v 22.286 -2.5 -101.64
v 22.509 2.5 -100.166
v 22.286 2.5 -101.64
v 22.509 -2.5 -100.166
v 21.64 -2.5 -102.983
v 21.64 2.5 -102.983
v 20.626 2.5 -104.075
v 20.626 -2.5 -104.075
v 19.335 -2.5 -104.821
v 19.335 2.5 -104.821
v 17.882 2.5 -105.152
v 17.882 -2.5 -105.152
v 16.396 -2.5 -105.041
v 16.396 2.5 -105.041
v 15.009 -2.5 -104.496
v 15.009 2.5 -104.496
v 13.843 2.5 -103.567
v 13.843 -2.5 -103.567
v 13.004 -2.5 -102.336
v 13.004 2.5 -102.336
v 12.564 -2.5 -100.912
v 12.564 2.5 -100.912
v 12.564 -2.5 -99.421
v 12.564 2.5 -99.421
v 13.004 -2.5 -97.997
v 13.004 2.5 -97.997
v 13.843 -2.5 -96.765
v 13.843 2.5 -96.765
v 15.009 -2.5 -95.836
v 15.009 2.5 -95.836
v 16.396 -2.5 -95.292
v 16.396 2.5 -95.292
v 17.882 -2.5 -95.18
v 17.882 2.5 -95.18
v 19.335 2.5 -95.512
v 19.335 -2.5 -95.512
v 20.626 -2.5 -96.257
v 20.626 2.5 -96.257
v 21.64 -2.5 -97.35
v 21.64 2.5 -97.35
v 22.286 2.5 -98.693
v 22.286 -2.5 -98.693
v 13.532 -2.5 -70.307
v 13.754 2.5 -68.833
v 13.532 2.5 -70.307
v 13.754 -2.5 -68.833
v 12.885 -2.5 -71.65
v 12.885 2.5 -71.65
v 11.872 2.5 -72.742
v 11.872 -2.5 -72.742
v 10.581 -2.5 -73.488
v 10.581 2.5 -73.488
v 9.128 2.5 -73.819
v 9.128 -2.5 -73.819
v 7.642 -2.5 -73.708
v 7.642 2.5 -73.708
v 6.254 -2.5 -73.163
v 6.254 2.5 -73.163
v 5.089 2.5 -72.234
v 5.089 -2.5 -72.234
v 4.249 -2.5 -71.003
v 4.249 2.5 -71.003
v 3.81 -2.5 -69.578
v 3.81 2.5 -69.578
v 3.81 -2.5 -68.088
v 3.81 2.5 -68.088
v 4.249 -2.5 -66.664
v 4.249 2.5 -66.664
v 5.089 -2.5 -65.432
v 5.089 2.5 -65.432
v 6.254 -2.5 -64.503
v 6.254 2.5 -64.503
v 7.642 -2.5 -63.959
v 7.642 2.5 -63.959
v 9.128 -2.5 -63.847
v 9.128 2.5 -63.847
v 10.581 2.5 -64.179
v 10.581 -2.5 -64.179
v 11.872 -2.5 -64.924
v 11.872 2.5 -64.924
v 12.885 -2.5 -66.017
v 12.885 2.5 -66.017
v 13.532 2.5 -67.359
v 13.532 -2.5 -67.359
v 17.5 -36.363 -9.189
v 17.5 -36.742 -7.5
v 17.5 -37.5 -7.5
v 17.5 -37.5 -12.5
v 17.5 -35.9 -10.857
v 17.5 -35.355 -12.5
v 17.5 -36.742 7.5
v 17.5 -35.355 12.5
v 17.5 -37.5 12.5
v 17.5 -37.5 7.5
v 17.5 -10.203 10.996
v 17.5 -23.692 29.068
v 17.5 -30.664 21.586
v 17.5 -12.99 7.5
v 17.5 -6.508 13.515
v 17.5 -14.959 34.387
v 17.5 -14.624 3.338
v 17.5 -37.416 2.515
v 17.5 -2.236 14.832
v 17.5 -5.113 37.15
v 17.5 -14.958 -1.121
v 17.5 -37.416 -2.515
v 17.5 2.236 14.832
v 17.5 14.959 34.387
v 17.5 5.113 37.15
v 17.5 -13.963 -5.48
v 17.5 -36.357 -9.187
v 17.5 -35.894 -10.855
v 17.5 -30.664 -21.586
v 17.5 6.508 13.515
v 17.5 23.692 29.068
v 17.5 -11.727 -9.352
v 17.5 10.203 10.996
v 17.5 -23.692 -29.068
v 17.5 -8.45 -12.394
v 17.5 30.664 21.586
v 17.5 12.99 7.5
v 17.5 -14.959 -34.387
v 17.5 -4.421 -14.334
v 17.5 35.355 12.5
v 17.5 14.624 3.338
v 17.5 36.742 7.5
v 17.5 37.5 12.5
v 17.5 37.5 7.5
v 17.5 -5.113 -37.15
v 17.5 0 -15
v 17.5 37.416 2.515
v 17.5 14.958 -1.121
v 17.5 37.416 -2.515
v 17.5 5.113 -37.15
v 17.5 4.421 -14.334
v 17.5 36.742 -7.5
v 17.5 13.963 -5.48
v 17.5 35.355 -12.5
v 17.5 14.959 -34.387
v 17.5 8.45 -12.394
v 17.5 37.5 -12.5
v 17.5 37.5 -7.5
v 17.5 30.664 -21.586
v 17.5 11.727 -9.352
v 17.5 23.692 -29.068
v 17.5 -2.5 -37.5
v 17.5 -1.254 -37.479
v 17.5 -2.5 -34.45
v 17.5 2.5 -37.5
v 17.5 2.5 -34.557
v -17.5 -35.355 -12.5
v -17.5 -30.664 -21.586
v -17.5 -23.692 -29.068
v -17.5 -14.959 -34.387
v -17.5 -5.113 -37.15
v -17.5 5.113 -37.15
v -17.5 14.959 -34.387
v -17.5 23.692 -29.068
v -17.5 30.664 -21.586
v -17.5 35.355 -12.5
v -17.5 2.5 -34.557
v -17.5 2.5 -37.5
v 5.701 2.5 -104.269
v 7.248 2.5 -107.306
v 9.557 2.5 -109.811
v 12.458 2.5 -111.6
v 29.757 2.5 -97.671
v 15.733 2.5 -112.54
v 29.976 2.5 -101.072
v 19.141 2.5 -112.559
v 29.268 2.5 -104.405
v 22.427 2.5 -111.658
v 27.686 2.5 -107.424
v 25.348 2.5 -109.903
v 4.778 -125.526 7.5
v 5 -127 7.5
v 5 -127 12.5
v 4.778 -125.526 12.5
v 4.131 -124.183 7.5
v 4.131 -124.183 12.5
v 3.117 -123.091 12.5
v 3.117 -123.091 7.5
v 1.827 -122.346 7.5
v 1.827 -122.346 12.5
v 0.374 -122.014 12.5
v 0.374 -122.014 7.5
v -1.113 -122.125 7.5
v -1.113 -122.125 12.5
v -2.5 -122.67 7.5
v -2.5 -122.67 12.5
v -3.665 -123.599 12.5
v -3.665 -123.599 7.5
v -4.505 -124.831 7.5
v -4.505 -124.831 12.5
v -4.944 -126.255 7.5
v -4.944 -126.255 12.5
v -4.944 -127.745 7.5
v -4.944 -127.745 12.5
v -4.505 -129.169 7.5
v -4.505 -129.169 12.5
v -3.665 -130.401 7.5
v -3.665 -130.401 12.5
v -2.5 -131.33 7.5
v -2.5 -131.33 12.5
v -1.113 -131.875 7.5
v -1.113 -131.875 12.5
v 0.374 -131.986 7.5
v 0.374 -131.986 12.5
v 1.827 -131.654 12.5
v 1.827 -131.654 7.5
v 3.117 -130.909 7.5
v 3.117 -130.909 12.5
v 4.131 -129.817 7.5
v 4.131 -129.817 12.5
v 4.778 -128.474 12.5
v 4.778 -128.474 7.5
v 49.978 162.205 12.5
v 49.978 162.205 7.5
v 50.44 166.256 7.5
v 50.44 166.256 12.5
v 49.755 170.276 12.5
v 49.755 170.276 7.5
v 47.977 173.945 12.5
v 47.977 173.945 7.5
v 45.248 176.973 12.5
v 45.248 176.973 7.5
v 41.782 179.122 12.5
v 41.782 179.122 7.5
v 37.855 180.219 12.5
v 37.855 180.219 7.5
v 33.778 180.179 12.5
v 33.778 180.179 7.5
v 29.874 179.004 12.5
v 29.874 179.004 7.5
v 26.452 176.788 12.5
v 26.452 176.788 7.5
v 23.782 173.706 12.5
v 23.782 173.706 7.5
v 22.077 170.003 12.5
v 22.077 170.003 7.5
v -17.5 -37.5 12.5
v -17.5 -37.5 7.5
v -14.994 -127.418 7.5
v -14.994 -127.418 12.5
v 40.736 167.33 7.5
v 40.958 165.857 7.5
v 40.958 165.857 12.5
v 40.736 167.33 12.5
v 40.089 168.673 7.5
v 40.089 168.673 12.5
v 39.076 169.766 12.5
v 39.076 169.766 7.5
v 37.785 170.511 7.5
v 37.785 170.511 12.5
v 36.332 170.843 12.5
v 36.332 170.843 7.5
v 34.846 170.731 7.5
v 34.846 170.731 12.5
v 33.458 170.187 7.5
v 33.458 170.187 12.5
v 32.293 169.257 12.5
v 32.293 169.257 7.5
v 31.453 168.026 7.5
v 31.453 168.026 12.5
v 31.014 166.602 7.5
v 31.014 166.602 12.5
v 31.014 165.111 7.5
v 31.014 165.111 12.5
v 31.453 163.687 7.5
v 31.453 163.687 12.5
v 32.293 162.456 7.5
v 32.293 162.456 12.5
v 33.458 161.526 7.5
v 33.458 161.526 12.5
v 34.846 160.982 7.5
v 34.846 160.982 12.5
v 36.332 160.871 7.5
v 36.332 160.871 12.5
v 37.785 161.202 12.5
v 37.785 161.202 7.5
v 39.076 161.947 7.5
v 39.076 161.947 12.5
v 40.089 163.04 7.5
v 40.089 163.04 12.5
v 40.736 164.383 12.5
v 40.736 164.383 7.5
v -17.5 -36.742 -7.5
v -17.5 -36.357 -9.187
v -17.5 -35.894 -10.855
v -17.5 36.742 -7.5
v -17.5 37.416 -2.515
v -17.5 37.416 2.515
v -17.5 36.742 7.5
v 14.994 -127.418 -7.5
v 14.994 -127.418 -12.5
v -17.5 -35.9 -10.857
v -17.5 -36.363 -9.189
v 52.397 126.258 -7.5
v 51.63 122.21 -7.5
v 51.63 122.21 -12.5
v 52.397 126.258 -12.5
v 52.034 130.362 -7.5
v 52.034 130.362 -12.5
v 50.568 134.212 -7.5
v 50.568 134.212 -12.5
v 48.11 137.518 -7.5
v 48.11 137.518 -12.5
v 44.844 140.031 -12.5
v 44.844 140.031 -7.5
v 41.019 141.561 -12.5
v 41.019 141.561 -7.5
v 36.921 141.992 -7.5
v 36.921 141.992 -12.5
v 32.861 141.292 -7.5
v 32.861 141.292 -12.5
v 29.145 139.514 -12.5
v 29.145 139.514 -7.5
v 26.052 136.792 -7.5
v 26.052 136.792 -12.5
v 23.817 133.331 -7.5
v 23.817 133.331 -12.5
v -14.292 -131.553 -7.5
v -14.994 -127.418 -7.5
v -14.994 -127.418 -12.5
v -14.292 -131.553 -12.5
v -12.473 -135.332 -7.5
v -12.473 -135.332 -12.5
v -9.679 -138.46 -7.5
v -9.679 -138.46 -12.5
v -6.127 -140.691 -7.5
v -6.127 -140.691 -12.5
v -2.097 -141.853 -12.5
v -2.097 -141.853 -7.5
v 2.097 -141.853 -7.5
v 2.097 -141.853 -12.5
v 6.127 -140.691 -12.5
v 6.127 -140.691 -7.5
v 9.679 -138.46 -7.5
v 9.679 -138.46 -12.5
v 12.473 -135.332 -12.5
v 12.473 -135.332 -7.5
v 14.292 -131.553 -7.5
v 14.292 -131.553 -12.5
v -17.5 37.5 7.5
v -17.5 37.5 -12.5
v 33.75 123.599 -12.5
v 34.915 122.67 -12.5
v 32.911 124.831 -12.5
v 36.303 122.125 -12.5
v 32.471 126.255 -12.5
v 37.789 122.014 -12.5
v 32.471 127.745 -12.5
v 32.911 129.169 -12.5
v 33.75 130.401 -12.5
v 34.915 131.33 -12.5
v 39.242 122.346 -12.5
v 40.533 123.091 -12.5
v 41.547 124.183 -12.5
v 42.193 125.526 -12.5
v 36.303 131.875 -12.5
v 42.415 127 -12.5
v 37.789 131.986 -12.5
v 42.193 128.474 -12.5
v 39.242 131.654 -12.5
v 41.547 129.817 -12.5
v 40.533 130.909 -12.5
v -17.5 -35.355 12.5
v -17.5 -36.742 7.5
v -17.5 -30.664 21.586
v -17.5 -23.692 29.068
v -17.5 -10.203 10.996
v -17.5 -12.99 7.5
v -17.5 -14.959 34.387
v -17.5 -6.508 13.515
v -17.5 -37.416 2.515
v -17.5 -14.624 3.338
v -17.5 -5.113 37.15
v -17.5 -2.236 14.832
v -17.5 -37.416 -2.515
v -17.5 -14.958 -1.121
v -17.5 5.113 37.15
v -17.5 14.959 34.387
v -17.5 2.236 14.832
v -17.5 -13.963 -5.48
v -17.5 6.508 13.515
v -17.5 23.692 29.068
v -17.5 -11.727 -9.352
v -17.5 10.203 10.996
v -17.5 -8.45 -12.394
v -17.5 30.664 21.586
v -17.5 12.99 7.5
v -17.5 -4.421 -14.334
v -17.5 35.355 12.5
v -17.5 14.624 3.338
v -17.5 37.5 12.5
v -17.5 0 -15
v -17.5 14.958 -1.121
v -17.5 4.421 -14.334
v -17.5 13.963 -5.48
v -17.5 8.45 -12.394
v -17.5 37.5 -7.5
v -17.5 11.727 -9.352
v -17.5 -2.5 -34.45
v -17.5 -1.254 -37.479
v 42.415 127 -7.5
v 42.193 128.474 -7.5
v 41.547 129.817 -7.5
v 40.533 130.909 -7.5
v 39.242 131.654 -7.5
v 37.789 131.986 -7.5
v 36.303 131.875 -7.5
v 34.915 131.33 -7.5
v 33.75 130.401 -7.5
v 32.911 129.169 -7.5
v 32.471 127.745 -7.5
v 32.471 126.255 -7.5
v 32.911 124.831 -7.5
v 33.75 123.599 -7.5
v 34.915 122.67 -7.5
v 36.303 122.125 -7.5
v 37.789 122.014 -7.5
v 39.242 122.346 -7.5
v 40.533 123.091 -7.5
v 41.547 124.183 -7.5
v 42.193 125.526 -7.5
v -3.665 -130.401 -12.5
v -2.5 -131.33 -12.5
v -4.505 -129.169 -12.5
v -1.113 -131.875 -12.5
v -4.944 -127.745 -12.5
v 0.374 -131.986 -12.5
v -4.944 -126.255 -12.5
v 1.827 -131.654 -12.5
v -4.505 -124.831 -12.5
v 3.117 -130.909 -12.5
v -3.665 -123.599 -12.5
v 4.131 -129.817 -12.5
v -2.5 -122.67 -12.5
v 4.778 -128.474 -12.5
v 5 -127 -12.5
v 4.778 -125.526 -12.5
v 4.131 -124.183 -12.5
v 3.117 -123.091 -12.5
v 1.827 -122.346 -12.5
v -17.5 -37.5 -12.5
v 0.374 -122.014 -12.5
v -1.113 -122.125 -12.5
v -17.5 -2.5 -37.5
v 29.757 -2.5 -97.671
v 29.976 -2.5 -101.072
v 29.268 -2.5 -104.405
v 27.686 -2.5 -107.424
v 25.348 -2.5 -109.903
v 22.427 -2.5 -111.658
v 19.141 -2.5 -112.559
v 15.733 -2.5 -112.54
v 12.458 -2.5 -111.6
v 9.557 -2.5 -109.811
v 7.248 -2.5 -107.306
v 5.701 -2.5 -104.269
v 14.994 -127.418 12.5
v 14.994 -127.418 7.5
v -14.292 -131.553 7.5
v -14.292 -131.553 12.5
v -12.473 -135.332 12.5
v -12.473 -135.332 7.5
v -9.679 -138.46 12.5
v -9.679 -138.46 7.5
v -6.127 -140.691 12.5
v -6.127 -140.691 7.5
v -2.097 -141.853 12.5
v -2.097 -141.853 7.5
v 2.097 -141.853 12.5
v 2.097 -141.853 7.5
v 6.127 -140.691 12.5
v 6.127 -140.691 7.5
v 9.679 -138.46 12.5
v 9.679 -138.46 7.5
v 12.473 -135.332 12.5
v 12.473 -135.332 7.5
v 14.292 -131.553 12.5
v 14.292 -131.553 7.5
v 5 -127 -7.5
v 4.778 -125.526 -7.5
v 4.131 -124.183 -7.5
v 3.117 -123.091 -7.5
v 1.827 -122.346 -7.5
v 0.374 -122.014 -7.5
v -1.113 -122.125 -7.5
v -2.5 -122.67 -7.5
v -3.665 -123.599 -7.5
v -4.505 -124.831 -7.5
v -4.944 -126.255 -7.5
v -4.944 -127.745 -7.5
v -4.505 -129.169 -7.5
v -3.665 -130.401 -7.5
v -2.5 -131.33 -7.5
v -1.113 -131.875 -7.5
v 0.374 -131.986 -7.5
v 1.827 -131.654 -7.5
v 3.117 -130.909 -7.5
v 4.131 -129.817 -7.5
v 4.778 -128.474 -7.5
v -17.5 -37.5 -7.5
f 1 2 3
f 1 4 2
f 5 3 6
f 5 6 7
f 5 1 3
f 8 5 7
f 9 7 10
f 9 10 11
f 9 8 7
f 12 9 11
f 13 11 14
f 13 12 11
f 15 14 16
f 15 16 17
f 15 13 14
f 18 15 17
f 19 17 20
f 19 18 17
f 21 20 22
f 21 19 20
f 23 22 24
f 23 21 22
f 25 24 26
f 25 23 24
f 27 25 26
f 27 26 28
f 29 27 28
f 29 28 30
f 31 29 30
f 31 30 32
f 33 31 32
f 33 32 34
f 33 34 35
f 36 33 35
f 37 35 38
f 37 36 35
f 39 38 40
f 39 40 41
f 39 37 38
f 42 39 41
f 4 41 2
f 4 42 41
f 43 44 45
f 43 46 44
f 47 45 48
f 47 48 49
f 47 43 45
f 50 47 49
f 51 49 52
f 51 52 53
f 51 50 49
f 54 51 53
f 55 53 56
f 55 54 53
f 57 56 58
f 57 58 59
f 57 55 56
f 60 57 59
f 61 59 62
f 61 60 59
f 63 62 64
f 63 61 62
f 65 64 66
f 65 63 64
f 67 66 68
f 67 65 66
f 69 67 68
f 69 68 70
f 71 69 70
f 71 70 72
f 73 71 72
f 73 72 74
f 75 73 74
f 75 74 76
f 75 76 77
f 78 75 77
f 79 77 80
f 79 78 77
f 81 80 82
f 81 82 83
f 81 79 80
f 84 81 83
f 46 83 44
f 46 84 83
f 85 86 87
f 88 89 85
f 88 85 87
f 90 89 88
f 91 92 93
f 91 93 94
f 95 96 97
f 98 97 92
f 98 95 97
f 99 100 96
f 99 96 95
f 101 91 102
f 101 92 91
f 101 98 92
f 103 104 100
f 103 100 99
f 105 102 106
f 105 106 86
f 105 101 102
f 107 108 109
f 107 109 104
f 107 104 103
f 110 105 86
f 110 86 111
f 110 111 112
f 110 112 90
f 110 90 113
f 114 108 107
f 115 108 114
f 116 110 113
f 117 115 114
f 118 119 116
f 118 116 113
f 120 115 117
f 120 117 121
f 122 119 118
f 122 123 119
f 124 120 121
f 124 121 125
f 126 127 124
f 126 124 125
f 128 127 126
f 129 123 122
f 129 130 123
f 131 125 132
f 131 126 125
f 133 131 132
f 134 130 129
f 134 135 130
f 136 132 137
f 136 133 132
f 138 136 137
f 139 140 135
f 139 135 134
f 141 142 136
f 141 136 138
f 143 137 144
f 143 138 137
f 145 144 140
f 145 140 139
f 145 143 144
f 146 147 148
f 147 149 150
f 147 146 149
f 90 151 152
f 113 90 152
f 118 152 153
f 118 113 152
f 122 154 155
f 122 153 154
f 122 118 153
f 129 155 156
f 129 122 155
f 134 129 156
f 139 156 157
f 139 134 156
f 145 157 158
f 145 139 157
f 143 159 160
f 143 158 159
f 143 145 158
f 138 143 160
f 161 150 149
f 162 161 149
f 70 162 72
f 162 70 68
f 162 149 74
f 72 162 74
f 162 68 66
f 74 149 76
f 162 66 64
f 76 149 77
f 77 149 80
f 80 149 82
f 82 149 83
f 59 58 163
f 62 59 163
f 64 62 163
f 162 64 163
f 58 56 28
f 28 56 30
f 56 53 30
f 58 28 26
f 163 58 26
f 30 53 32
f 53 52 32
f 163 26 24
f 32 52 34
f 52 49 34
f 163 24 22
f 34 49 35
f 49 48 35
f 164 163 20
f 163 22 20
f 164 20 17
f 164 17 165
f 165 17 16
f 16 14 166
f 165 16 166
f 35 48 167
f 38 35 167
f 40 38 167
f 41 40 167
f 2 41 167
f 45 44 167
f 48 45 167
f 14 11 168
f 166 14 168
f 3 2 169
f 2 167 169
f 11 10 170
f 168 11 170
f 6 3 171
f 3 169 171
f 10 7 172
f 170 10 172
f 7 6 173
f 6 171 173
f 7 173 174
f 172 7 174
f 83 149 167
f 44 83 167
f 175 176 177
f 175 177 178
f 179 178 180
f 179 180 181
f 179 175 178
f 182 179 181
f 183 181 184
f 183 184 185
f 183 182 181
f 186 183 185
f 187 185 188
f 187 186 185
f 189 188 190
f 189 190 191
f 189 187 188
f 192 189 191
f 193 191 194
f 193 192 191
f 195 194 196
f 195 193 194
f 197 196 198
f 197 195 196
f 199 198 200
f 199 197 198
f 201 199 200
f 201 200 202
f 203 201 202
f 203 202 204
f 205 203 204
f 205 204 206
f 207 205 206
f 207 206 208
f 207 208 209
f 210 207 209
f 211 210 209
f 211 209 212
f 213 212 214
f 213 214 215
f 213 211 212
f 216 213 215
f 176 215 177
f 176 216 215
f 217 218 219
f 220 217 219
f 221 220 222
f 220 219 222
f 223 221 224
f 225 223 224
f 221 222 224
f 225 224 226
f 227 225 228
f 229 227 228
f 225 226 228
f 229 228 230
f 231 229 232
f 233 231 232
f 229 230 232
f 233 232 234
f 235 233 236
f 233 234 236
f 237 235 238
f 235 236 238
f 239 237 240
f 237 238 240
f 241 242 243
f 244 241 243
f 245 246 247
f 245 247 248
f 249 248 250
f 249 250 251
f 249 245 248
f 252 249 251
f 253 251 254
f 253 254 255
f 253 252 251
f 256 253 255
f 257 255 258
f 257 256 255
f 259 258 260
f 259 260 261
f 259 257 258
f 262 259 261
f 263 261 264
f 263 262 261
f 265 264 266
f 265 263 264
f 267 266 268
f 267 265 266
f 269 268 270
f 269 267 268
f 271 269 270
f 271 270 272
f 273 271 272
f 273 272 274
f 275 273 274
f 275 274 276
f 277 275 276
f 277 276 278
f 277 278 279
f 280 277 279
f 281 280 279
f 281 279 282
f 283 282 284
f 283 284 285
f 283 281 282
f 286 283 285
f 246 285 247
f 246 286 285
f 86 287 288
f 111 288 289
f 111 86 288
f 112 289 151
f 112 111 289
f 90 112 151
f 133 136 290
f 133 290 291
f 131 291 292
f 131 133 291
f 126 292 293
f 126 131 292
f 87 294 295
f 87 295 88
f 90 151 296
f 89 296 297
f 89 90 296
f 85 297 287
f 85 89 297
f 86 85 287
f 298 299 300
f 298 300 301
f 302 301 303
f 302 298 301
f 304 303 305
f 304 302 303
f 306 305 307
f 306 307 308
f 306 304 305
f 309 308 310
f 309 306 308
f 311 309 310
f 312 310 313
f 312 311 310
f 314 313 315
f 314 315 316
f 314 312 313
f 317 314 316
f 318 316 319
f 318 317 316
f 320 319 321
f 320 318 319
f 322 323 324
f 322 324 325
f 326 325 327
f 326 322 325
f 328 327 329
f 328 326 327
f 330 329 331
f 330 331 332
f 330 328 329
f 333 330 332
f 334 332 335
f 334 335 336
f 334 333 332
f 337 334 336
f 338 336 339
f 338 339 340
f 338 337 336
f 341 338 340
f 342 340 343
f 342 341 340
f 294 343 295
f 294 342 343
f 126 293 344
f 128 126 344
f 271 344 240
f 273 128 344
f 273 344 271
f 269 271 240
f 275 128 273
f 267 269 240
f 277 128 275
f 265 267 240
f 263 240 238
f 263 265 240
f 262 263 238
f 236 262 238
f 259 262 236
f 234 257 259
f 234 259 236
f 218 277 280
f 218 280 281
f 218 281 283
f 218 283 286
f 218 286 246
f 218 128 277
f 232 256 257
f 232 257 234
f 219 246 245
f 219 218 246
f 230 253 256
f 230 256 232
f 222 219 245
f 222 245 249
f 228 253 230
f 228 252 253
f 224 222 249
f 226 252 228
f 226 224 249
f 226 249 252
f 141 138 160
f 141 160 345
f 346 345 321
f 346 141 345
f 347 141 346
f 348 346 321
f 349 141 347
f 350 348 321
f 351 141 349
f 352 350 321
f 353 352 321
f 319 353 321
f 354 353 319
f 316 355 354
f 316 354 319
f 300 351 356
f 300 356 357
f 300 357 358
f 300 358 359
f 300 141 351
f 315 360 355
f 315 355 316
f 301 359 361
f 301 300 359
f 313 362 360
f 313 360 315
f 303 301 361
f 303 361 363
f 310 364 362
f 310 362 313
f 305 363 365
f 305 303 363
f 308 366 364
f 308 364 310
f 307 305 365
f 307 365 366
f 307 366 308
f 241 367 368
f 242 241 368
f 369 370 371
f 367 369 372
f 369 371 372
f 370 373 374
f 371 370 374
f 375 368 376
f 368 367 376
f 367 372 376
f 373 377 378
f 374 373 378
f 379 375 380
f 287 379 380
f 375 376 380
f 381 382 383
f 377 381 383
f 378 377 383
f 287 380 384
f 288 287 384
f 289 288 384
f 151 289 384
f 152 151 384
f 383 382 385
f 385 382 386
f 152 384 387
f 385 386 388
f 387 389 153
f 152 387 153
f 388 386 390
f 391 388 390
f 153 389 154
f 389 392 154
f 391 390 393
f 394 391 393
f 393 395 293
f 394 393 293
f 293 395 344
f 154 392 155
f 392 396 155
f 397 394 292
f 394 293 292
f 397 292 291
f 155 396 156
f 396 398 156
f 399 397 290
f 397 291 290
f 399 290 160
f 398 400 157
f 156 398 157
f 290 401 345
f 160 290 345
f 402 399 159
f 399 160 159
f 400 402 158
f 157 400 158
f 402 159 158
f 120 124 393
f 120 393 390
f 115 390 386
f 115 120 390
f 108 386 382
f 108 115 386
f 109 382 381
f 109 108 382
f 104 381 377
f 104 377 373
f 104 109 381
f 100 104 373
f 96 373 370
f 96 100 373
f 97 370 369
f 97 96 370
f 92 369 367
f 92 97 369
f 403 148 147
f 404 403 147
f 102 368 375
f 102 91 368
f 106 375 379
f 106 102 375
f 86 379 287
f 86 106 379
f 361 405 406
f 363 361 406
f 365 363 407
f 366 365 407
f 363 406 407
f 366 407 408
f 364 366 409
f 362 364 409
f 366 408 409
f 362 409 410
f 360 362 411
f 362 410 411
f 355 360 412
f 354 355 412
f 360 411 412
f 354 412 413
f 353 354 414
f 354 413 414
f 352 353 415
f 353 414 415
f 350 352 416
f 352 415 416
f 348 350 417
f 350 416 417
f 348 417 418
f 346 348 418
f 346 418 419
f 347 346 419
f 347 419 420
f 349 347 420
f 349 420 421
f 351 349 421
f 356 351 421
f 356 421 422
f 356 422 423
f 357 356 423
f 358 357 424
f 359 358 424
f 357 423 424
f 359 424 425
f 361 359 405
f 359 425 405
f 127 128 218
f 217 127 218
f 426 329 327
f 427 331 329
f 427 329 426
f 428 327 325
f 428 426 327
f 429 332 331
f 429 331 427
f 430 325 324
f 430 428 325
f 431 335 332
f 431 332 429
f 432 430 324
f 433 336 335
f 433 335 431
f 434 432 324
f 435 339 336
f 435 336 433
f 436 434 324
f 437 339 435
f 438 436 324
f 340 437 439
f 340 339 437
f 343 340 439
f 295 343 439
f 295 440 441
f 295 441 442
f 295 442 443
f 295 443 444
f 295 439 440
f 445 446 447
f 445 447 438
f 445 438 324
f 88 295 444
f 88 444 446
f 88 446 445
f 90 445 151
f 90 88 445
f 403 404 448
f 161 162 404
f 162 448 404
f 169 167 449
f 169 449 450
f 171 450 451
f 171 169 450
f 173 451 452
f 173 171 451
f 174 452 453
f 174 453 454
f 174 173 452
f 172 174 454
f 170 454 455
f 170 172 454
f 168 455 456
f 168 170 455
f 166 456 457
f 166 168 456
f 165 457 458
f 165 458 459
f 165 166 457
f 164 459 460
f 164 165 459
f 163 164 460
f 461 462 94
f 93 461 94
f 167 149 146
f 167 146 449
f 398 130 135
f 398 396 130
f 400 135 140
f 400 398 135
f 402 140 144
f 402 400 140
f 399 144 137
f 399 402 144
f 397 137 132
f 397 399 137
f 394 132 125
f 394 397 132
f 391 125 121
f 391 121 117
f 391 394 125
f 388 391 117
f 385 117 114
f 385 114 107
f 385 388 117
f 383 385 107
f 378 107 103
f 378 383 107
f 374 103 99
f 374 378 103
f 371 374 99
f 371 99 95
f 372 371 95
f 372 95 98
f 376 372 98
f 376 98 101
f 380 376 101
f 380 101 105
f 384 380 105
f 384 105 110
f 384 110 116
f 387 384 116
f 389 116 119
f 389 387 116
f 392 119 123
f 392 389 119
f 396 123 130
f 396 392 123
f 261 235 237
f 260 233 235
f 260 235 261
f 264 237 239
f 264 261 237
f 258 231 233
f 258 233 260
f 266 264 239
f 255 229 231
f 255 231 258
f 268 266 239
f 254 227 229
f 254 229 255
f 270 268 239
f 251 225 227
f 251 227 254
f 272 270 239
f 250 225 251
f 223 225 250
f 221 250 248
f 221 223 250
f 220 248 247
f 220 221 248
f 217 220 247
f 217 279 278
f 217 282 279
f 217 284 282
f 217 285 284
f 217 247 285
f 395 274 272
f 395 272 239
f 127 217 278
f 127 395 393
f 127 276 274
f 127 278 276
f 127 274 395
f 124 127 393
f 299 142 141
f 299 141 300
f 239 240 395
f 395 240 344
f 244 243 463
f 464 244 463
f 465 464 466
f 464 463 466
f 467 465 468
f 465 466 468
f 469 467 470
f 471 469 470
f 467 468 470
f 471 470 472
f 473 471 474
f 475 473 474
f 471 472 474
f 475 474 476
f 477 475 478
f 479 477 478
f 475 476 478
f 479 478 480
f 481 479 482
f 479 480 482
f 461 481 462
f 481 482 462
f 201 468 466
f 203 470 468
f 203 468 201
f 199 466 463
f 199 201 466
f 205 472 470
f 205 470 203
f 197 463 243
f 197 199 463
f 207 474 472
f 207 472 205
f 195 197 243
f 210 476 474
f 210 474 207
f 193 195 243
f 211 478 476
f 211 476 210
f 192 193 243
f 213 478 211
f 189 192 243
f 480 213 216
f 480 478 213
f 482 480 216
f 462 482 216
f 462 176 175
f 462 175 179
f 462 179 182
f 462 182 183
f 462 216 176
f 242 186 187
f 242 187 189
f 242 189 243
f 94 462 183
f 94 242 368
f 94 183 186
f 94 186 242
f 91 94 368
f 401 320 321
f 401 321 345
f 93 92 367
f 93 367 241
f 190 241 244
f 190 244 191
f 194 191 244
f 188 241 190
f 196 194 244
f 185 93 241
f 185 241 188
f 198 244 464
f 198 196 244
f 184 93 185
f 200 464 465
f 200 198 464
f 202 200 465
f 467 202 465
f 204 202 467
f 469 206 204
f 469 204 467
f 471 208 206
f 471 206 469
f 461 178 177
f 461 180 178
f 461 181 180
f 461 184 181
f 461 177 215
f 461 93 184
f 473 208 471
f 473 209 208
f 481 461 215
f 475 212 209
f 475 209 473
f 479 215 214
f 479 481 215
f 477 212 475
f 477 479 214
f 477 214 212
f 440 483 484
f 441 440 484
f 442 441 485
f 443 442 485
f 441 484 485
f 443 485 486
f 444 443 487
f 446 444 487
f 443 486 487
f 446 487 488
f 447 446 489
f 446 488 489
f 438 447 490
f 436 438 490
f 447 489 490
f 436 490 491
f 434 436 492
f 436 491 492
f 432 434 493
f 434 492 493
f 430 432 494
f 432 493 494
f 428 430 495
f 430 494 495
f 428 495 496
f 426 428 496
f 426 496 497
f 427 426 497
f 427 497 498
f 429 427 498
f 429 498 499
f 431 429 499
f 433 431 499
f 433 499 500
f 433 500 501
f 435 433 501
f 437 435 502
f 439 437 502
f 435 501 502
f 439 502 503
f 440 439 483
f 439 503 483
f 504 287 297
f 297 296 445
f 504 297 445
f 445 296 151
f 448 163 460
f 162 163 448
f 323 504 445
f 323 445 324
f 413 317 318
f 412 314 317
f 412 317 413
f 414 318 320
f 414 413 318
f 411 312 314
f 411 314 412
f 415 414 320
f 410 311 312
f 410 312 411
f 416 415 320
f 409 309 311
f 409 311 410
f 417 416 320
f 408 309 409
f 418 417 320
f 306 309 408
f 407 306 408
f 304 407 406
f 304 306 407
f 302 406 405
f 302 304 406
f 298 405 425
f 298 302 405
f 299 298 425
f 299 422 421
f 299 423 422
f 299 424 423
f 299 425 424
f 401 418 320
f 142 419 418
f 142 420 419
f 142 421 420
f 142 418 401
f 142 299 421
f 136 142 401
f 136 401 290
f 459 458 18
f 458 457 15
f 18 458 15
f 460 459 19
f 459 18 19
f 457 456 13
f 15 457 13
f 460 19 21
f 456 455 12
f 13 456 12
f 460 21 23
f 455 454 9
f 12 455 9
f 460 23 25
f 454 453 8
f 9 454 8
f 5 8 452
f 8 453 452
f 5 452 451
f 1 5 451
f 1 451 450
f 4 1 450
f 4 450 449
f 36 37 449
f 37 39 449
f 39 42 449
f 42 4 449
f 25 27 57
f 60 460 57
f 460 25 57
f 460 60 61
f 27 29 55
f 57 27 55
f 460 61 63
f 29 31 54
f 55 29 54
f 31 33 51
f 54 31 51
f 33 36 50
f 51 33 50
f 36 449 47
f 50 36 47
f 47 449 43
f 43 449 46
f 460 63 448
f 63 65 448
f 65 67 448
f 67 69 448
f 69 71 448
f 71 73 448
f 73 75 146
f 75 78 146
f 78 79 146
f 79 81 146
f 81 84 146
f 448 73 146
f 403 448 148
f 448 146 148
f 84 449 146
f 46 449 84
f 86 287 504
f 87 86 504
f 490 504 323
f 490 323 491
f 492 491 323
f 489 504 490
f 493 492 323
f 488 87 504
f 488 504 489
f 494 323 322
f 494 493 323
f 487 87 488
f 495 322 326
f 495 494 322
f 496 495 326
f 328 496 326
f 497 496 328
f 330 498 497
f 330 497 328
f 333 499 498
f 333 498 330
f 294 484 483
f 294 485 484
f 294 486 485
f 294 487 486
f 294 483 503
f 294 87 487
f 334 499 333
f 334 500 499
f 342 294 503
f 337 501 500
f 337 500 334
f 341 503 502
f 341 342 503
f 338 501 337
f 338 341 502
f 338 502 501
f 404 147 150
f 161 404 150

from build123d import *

# Parameters (mm, degrees)
SKETCH1_R             = 37.5
SKETCH1_R_2           = 15
BOSS_EXTRUDE1_DEPTH   = 17.5
SKETCH5_R             = 5
BOSS_EXTRUDE3_DEPTH   = 5
BOSS_EXTRUDE3_2_DEPTH = 5
SKETCH4_R             = 5
BOSS_EXTRUDE5_DEPTH   = 5
BOSS_EXTRUDE5_2_DEPTH = 5
SKETCH10_R            = 5
BOSS_EXTRUDE8_DEPTH   = 2.5
BOSS_EXTRUDE9_DEPTH   = 35
BOSS_EXTRUDE10_DEPTH  = 35


with BuildPart() as part:
    # Sketch1 → Boss-Extrude1 (new body, symmetric)
    with BuildSketch(Plane(origin=(0, 0, 0), x_dir=(0, 0, -1), z_dir=(1, 0, 0))):
        Circle(SKETCH1_R)
        Circle(SKETCH1_R_2, mode=Mode.SUBTRACT)
    extrude(amount=BOSS_EXTRUDE1_DEPTH, both=True)



with BuildPart() as body_2:
    # Sketch5 → Boss-Extrude3 (new body)
    with BuildSketch(Plane.XY.offset(-7.5)):
        with BuildLine():
            Line((-17.5, -37.5), (-14.994178744, -127.417856179))
            ThreePointArc((-14.994178744, -127.417856179), (0, -142), (14.994178744, -127.417856179))
            Line((14.994178744, -127.417856179), (17.5, -37.5))
            Line((17.5, -37.5), (-17.5, -37.5))
        make_face()
        with Locations((0, -127)):
            Circle(SKETCH5_R, mode=Mode.SUBTRACT)
    extrude(amount=-BOSS_EXTRUDE3_DEPTH)


with BuildPart() as body_3:
    # Sketch5 → Boss-Extrude3 2 (new body)
    with BuildSketch(Plane.XY.offset(-7.5)):
        with BuildLine():
            Line((-17.5, 37.5), (17.5, 37.5))
            Line((17.5, 37.5), (51.629964252, 122.209648423))
            ThreePointArc((51.629964252, 122.209648423), (42.984432417, 140.927899671), (23.816779492, 133.330582259))
            Line((23.816779492, 133.330582259), (-17.5, 37.5))
        make_face()
        with Locations((37.415445907, 127)):
            Circle(SKETCH5_R, mode=Mode.SUBTRACT)
    extrude(amount=-BOSS_EXTRUDE3_2_DEPTH)


with BuildPart() as body_4:
    # Sketch4 → Boss-Extrude5 (new body)
    with BuildSketch(Plane.XY.offset(7.5)):
        with BuildLine():
            Line((-17.5, -37.5), (-14.994178744, -127.417856179))
            ThreePointArc((-14.994178744, -127.417856179), (0, -142), (14.994178744, -127.417856179))
            Line((14.994178744, -127.417856179), (17.5, -37.5))
            Line((17.5, -37.5), (-17.5, -37.5))
        make_face()
        with Locations((0, -127)):
            Circle(SKETCH4_R, mode=Mode.SUBTRACT)
    extrude(amount=BOSS_EXTRUDE5_DEPTH)


with BuildPart() as body_5:
    # Sketch4 → Boss-Extrude5 2 (new body)
    with BuildSketch(Plane.XY.offset(7.5)):
        with BuildLine():
            Line((-17.5, 37.5), (17.5, 37.5))
            Line((17.5, 37.5), (49.97768135, 162.205466156))
            ThreePointArc((49.97768135, 162.205466156), (39.857524308, 179.809052463), (22.07719266, 170.002746536))
            Line((22.07719266, 170.002746536), (-17.5, 37.5))
        make_face()
        with Locations((35.95827062, 165.856612881)):
            Circle(SKETCH4_R, mode=Mode.SUBTRACT)
    extrude(amount=BOSS_EXTRUDE5_2_DEPTH)


with BuildPart() as body_6:
    # Sketch10 → Boss-Extrude8 (new body, symmetric)
    with BuildSketch(Plane(origin=(0, 0, 0), x_dir=(1, 0, 0), z_dir=(0, 1, 0))):
        with BuildLine():
            Line((-17.5, 37.5), (17.5, 37.5))
            Line((17.5, 37.5), (29.756996459, 97.671263278))
            ThreePointArc((29.756996459, 97.671263278), (20.81485241, 112.22109988), (5.701063799, 104.269176894))
            Line((5.701063799, 104.269176894), (-17.5, 37.5))
        make_face()
        with Locations((17.508535112, 100.166297272)):
            Circle(SKETCH10_R, mode=Mode.SUBTRACT)
        with Locations((8.754267556, 68.833148636)):
            Circle(SKETCH10_R, mode=Mode.SUBTRACT)
    extrude(amount=BOSS_EXTRUDE8_DEPTH, both=True)

    # Sketch11 → Boss-Extrude9 (add)
    with BuildSketch(Plane(origin=(17.5, 0, 0), x_dir=(0, 0, -1), z_dir=(1, 0, 0))):
        Polygon((37.5, -2.5), (34.44981399, -2.5), (37.479028687, -1.253957217), (34.556673216, 2.5), (37.5, 2.5), align=None)
    extrude(amount=-BOSS_EXTRUDE9_DEPTH)


with BuildPart() as part_1:
    add(part.part)

    add(body_2.part)  # Boss-Extrude10 merges body 2

    add(body_3.part)  # Boss-Extrude10 merges body 3

    add(body_4.part)  # Boss-Extrude10 merges body 4

    add(body_5.part)  # Boss-Extrude10 merges body 5
    # Sketch7 → Boss-Extrude10 (add)
    with BuildSketch(Plane(origin=(17.5, 0, 0), x_dir=(0, 0, -1), z_dir=(1, 0, 0))):
        with BuildLine():
            Line((-7.5, 37.5), (-12.5, 37.5))
            Line((-12.5, 37.5), (-12.5, 35.355339059))
            ThreePointArc((-12.5, 35.355339059), (-10.024018514, 36.135426562), (-7.5, 36.742346142))
            Line((-7.5, 36.742346142), (-7.5, 37.5))
        make_face()
        with BuildLine():
            Line((7.5, 37.5), (7.5, 36.742346142))
            ThreePointArc((7.5, 36.742346142), (10.024018514, 36.135426562), (12.5, 35.355339059))
            Line((12.5, 35.355339059), (12.5, 37.5))
            Line((12.5, 37.5), (7.5, 37.5))
        make_face()
        with BuildLine():
            Line((7.5, -36.742346142), (7.5, -37.5))
            Line((7.5, -37.5), (12.5, -37.5))
            Line((12.5, -37.5), (12.5, -35.355339059))
            ThreePointArc((12.5, -35.355339059), (10.025738696, -36.141627621), (7.5, -36.742346142))
        make_face()
        with BuildLine():
            Line((-12.5, -37.5), (-7.5, -37.5))
            Line((-7.5, -37.5), (-7.5, -36.742346142))
            ThreePointArc((-7.5, -36.742346142), (-10.024018514, -36.135426562), (-12.5, -35.355339059))
            Line((-12.5, -35.355339059), (-12.5, -37.5))
        make_face()
    extrude(amount=-BOSS_EXTRUDE10_DEPTH)


solid = Compound([body_6.part, part_1.part])
